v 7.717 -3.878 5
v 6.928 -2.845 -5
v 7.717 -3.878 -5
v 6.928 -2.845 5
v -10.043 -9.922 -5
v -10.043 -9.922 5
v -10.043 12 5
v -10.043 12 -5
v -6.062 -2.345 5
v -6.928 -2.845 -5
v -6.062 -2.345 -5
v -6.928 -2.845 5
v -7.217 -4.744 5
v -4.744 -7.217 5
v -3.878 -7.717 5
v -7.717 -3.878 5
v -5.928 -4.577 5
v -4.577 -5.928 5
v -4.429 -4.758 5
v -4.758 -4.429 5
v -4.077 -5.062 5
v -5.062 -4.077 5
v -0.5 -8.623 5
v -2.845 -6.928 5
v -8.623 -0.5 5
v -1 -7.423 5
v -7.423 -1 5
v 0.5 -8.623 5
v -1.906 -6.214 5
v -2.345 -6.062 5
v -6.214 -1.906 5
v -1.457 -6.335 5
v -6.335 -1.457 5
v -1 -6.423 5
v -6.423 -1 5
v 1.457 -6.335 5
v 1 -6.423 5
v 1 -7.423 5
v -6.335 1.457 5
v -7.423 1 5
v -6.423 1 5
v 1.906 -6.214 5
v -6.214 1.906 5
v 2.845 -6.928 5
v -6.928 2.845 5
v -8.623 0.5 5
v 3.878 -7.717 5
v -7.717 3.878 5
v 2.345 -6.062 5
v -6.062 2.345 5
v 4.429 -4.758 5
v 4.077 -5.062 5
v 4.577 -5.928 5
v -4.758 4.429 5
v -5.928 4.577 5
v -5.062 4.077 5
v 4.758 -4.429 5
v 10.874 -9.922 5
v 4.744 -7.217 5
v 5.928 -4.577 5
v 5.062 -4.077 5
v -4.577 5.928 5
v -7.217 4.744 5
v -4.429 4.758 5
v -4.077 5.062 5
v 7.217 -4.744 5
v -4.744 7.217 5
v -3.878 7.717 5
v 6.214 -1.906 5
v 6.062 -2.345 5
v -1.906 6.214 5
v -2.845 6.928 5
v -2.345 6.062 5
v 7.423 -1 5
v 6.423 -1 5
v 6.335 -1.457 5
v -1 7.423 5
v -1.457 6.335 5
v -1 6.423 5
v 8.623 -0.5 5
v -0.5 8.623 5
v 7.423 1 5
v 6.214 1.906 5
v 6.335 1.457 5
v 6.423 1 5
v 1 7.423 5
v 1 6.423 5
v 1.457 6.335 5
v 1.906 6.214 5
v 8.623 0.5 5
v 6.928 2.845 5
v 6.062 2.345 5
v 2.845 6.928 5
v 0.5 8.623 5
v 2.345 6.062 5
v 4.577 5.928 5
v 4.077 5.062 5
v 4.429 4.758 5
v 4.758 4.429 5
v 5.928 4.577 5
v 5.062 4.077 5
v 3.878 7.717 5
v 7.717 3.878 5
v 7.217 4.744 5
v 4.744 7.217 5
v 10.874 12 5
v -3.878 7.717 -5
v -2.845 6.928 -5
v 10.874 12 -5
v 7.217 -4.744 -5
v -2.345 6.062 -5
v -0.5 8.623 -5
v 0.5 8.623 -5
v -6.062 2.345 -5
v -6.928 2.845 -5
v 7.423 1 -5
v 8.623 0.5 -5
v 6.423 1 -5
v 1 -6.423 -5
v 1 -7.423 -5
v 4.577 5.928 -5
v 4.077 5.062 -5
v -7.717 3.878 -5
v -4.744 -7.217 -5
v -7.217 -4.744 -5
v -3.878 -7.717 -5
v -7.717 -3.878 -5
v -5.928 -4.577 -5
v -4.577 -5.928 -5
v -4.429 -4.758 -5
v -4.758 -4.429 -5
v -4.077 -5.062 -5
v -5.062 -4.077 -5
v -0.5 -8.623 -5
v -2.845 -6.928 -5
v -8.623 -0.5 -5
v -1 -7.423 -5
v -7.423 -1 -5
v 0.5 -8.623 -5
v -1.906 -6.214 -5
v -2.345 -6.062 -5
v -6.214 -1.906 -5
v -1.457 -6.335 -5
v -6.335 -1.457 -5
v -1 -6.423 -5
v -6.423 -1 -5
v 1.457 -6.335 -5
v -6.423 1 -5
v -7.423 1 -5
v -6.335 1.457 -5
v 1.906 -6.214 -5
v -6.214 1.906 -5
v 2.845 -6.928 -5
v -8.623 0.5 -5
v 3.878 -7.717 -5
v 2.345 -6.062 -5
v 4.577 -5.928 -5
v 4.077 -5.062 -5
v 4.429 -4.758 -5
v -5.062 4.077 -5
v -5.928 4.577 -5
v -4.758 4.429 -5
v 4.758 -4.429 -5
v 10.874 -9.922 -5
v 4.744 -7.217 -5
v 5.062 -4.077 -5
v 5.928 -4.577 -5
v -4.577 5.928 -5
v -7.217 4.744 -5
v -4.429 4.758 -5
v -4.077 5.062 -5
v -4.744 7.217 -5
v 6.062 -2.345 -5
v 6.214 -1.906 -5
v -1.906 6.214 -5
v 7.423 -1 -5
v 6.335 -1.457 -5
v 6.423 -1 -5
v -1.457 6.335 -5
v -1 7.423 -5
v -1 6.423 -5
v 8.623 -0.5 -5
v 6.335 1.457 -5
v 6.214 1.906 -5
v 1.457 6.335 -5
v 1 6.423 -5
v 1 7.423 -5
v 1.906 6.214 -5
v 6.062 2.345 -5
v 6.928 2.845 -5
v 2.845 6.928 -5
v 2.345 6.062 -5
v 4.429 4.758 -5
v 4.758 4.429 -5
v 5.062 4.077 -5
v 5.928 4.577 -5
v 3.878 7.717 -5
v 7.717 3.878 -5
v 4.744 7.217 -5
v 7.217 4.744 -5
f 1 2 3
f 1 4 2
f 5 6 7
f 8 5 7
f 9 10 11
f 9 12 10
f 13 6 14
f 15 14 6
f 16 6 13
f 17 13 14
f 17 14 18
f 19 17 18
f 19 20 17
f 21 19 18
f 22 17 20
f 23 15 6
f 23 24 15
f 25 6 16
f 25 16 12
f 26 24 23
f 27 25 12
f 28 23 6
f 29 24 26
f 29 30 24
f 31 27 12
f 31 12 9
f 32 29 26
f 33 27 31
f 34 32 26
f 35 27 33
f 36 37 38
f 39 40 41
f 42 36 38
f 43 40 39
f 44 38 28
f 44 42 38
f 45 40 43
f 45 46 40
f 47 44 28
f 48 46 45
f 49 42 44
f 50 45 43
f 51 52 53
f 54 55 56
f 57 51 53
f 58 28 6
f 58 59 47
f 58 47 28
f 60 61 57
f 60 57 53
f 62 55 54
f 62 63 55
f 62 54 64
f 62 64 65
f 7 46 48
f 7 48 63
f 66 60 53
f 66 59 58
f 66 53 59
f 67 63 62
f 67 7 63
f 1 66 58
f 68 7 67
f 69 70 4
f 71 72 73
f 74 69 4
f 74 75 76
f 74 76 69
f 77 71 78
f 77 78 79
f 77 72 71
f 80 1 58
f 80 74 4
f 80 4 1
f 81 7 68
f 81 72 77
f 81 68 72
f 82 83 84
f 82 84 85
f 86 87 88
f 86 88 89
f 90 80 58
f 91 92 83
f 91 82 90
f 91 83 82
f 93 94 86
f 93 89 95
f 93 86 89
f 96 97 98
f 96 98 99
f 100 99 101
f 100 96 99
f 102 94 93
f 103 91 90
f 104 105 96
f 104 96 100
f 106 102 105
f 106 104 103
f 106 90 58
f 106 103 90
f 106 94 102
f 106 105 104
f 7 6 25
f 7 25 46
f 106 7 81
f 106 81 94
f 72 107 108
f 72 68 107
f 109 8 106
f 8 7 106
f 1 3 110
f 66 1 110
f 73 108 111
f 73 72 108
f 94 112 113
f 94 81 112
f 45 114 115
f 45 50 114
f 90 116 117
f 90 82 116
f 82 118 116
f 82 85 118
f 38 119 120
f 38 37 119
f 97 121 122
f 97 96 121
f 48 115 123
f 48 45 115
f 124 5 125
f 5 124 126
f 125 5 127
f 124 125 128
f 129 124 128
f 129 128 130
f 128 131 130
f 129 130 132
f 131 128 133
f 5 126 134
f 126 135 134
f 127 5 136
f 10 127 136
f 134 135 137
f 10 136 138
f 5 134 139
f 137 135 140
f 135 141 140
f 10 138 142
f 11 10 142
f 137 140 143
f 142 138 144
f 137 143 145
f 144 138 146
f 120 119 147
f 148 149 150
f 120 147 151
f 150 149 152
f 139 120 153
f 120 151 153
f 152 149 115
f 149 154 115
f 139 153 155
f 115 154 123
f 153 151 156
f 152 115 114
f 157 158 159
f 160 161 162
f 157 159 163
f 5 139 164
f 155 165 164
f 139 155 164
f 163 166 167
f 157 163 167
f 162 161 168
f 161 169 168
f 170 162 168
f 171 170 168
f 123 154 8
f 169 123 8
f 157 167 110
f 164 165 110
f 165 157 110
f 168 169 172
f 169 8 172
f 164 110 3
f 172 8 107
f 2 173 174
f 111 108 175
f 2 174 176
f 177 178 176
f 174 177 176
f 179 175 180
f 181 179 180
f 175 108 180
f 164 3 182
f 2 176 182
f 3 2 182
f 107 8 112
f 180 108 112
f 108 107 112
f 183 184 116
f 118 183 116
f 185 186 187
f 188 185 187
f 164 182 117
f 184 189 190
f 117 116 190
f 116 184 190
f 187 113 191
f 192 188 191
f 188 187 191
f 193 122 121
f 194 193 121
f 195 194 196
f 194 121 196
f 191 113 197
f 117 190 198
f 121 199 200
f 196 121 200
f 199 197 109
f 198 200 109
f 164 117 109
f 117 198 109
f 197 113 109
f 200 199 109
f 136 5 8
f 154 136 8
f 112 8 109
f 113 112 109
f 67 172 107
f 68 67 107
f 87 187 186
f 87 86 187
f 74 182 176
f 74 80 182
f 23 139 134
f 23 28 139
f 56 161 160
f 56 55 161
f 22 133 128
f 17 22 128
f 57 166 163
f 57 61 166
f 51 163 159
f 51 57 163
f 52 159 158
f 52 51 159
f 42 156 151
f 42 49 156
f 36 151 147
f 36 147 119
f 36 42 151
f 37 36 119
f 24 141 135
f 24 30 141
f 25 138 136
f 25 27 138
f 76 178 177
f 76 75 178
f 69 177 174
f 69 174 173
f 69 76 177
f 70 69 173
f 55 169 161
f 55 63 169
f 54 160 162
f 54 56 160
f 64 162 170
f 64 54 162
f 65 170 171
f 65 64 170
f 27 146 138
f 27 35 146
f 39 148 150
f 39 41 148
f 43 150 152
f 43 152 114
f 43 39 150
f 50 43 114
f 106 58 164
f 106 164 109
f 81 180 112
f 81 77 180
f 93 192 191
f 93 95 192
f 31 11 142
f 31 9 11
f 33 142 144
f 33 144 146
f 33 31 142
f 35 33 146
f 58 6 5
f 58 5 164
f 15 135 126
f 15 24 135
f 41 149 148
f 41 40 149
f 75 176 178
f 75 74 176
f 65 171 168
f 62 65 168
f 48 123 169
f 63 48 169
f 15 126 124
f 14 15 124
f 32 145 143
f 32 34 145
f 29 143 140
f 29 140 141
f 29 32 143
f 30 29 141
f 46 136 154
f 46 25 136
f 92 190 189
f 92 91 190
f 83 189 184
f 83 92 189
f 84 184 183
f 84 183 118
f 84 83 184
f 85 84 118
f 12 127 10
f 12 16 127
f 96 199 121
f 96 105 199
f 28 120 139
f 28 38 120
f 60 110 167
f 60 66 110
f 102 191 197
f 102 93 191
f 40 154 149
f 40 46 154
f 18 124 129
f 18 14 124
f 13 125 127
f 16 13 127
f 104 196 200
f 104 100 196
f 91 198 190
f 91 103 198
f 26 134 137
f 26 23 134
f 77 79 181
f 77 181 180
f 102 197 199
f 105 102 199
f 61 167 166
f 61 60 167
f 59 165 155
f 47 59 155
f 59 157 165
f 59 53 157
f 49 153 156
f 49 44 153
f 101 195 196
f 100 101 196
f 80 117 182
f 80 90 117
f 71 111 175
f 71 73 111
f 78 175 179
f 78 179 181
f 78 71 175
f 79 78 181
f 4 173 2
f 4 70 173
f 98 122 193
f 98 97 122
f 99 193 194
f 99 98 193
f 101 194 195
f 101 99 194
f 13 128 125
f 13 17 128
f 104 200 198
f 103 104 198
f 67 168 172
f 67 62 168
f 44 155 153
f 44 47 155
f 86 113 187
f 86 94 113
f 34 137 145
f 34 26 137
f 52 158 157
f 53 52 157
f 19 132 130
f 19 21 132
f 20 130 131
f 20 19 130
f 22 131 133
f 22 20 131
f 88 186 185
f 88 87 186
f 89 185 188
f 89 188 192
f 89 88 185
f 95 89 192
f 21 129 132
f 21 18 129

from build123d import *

# Parameters (mm, degrees)
SKETCH1_W           = 20.917422255
SKETCH1_H           = 21.921735574
BOSS_EXTRUDE1_DEPTH = 5


with BuildPart() as part:
    # Sketch1 → Boss-Extrude1 (new body, symmetric)
    with BuildSketch(Plane.XY):
        with Locations((0.415577926, 1.038944814)):
            Rectangle(SKETCH1_W, SKETCH1_H)
        with BuildLine():
            Line((-1, 6.422616289), (-1, 7.422616289))
            Line((-1, 7.422616289), (-0.5, 8.622616289))
            Line((-0.5, 8.622616289), (0.5, 8.622616289))
            Line((0.5, 8.622616289), (1, 7.422616289))
            Line((1, 7.422616289), (1, 6.422616289))
            ThreePointArc((1, 6.422616289), (1.682323793, 6.278517871), (2.345282741, 6.062148865))
            Line((2.345282741, 6.062148865), (2.845282741, 6.928174269))
            Line((2.845282741, 6.928174269), (3.878295443, 7.717404754))
            Line((3.878295443, 7.717404754), (4.744320847, 7.217404754))
            Line((4.744320847, 7.217404754), (4.577333548, 5.928174269))
            Line((4.577333548, 5.928174269), (4.077333548, 5.062148865))
            ThreePointArc((4.077333548, 5.062148865), (4.596194078, 4.596194078), (5.062148865, 4.077333548))
            Line((5.062148865, 4.077333548), (5.928174269, 4.577333548))
            Line((5.928174269, 4.577333548), (7.217404754, 4.744320847))
            Line((7.217404754, 4.744320847), (7.717404754, 3.878295443))
            Line((7.717404754, 3.878295443), (6.928174269, 2.845282741))
            Line((6.928174269, 2.845282741), (6.062148865, 2.345282741))
            ThreePointArc((6.062148865, 2.345282741), (6.278517871, 1.682323793), (6.422616289, 1))
            Line((6.422616289, 1), (7.422616289, 1))
            Line((7.422616289, 1), (8.622616289, 0.5))
            Line((8.622616289, 0.5), (8.622616289, -0.5))
            Line((8.622616289, -0.5), (7.422616289, -1))
            Line((7.422616289, -1), (6.422616289, -1))
            ThreePointArc((6.422616289, -1), (6.278517871, -1.682323793), (6.062148865, -2.345282741))
            Line((6.062148865, -2.345282741), (6.928174269, -2.845282741))
            Line((6.928174269, -2.845282741), (7.717404754, -3.878295443))
            Line((7.717404754, -3.878295443), (7.217404754, -4.744320847))
            Line((7.217404754, -4.744320847), (5.928174269, -4.577333548))
            Line((5.928174269, -4.577333548), (5.062148865, -4.077333548))
            ThreePointArc((5.062148865, -4.077333548), (4.596194078, -4.596194078), (4.077333548, -5.062148865))
            Line((4.077333548, -5.062148865), (4.577333548, -5.928174269))
            Line((4.577333548, -5.928174269), (4.744320847, -7.217404754))
            Line((4.744320847, -7.217404754), (3.878295443, -7.717404754))
            Line((3.878295443, -7.717404754), (2.845282741, -6.928174269))
            Line((2.845282741, -6.928174269), (2.345282741, -6.062148865))
            ThreePointArc((2.345282741, -6.062148865), (1.682323793, -6.278517871), (1, -6.422616289))
            Line((1, -6.422616289), (1, -7.422616289))
            Line((1, -7.422616289), (0.5, -8.622616289))
            Line((0.5, -8.622616289), (-0.5, -8.622616289))
            Line((-0.5, -8.622616289), (-1, -7.422616289))
            Line((-1, -7.422616289), (-1, -6.422616289))
            ThreePointArc((-1, -6.422616289), (-1.682323793, -6.278517871), (-2.345282741, -6.062148865))
            Line((-2.345282741, -6.062148865), (-2.845282741, -6.928174269))
            Line((-2.845282741, -6.928174269), (-3.878295443, -7.717404754))
            Line((-3.878295443, -7.717404754), (-4.744320847, -7.217404754))
            Line((-4.744320847, -7.217404754), (-4.577333548, -5.928174269))
            Line((-4.577333548, -5.928174269), (-4.077333548, -5.062148865))
            ThreePointArc((-4.077333548, -5.062148865), (-4.596194078, -4.596194078), (-5.062148865, -4.077333548))
            Line((-5.062148865, -4.077333548), (-5.928174269, -4.577333548))
            Line((-5.928174269, -4.577333548), (-7.217404754, -4.744320847))
            Line((-7.217404754, -4.744320847), (-7.717404754, -3.878295443))
            Line((-7.717404754, -3.878295443), (-6.928174269, -2.845282741))
            Line((-6.928174269, -2.845282741), (-6.062148865, -2.345282741))
            ThreePointArc((-6.062148865, -2.345282741), (-6.278517871, -1.682323793), (-6.422616289, -1))
            Line((-6.422616289, -1), (-7.422616289, -1))
            Line((-7.422616289, -1), (-8.622616289, -0.5))
            Line((-8.622616289, -0.5), (-8.622616289, 0.5))
            Line((-8.622616289, 0.5), (-7.422616289, 1))
            Line((-7.422616289, 1), (-6.422616289, 1))
            ThreePointArc((-6.422616289, 1), (-6.278517871, 1.682323793), (-6.062148865, 2.345282741))
            Line((-6.062148865, 2.345282741), (-6.928174269, 2.845282741))
            Line((-6.928174269, 2.845282741), (-7.717404754, 3.878295443))
            Line((-7.717404754, 3.878295443), (-7.217404754, 4.744320847))
            Line((-7.217404754, 4.744320847), (-5.928174269, 4.577333548))
            Line((-5.928174269, 4.577333548), (-5.062148865, 4.077333548))
            ThreePointArc((-5.062148865, 4.077333548), (-4.596194078, 4.596194078), (-4.077333548, 5.062148865))
            Line((-4.077333548, 5.062148865), (-4.577333548, 5.928174269))
            Line((-4.577333548, 5.928174269), (-4.744320847, 7.217404754))
            Line((-4.744320847, 7.217404754), (-3.878295443, 7.717404754))
            Line((-3.878295443, 7.717404754), (-2.845282741, 6.928174269))
            Line((-2.845282741, 6.928174269), (-2.345282741, 6.062148865))
            ThreePointArc((-2.345282741, 6.062148865), (-1.682323793, 6.278517871), (-1, 6.422616289))
        make_face(mode=Mode.SUBTRACT)
    extrude(amount=BOSS_EXTRUDE1_DEPTH, both=True)


solid = part.part
